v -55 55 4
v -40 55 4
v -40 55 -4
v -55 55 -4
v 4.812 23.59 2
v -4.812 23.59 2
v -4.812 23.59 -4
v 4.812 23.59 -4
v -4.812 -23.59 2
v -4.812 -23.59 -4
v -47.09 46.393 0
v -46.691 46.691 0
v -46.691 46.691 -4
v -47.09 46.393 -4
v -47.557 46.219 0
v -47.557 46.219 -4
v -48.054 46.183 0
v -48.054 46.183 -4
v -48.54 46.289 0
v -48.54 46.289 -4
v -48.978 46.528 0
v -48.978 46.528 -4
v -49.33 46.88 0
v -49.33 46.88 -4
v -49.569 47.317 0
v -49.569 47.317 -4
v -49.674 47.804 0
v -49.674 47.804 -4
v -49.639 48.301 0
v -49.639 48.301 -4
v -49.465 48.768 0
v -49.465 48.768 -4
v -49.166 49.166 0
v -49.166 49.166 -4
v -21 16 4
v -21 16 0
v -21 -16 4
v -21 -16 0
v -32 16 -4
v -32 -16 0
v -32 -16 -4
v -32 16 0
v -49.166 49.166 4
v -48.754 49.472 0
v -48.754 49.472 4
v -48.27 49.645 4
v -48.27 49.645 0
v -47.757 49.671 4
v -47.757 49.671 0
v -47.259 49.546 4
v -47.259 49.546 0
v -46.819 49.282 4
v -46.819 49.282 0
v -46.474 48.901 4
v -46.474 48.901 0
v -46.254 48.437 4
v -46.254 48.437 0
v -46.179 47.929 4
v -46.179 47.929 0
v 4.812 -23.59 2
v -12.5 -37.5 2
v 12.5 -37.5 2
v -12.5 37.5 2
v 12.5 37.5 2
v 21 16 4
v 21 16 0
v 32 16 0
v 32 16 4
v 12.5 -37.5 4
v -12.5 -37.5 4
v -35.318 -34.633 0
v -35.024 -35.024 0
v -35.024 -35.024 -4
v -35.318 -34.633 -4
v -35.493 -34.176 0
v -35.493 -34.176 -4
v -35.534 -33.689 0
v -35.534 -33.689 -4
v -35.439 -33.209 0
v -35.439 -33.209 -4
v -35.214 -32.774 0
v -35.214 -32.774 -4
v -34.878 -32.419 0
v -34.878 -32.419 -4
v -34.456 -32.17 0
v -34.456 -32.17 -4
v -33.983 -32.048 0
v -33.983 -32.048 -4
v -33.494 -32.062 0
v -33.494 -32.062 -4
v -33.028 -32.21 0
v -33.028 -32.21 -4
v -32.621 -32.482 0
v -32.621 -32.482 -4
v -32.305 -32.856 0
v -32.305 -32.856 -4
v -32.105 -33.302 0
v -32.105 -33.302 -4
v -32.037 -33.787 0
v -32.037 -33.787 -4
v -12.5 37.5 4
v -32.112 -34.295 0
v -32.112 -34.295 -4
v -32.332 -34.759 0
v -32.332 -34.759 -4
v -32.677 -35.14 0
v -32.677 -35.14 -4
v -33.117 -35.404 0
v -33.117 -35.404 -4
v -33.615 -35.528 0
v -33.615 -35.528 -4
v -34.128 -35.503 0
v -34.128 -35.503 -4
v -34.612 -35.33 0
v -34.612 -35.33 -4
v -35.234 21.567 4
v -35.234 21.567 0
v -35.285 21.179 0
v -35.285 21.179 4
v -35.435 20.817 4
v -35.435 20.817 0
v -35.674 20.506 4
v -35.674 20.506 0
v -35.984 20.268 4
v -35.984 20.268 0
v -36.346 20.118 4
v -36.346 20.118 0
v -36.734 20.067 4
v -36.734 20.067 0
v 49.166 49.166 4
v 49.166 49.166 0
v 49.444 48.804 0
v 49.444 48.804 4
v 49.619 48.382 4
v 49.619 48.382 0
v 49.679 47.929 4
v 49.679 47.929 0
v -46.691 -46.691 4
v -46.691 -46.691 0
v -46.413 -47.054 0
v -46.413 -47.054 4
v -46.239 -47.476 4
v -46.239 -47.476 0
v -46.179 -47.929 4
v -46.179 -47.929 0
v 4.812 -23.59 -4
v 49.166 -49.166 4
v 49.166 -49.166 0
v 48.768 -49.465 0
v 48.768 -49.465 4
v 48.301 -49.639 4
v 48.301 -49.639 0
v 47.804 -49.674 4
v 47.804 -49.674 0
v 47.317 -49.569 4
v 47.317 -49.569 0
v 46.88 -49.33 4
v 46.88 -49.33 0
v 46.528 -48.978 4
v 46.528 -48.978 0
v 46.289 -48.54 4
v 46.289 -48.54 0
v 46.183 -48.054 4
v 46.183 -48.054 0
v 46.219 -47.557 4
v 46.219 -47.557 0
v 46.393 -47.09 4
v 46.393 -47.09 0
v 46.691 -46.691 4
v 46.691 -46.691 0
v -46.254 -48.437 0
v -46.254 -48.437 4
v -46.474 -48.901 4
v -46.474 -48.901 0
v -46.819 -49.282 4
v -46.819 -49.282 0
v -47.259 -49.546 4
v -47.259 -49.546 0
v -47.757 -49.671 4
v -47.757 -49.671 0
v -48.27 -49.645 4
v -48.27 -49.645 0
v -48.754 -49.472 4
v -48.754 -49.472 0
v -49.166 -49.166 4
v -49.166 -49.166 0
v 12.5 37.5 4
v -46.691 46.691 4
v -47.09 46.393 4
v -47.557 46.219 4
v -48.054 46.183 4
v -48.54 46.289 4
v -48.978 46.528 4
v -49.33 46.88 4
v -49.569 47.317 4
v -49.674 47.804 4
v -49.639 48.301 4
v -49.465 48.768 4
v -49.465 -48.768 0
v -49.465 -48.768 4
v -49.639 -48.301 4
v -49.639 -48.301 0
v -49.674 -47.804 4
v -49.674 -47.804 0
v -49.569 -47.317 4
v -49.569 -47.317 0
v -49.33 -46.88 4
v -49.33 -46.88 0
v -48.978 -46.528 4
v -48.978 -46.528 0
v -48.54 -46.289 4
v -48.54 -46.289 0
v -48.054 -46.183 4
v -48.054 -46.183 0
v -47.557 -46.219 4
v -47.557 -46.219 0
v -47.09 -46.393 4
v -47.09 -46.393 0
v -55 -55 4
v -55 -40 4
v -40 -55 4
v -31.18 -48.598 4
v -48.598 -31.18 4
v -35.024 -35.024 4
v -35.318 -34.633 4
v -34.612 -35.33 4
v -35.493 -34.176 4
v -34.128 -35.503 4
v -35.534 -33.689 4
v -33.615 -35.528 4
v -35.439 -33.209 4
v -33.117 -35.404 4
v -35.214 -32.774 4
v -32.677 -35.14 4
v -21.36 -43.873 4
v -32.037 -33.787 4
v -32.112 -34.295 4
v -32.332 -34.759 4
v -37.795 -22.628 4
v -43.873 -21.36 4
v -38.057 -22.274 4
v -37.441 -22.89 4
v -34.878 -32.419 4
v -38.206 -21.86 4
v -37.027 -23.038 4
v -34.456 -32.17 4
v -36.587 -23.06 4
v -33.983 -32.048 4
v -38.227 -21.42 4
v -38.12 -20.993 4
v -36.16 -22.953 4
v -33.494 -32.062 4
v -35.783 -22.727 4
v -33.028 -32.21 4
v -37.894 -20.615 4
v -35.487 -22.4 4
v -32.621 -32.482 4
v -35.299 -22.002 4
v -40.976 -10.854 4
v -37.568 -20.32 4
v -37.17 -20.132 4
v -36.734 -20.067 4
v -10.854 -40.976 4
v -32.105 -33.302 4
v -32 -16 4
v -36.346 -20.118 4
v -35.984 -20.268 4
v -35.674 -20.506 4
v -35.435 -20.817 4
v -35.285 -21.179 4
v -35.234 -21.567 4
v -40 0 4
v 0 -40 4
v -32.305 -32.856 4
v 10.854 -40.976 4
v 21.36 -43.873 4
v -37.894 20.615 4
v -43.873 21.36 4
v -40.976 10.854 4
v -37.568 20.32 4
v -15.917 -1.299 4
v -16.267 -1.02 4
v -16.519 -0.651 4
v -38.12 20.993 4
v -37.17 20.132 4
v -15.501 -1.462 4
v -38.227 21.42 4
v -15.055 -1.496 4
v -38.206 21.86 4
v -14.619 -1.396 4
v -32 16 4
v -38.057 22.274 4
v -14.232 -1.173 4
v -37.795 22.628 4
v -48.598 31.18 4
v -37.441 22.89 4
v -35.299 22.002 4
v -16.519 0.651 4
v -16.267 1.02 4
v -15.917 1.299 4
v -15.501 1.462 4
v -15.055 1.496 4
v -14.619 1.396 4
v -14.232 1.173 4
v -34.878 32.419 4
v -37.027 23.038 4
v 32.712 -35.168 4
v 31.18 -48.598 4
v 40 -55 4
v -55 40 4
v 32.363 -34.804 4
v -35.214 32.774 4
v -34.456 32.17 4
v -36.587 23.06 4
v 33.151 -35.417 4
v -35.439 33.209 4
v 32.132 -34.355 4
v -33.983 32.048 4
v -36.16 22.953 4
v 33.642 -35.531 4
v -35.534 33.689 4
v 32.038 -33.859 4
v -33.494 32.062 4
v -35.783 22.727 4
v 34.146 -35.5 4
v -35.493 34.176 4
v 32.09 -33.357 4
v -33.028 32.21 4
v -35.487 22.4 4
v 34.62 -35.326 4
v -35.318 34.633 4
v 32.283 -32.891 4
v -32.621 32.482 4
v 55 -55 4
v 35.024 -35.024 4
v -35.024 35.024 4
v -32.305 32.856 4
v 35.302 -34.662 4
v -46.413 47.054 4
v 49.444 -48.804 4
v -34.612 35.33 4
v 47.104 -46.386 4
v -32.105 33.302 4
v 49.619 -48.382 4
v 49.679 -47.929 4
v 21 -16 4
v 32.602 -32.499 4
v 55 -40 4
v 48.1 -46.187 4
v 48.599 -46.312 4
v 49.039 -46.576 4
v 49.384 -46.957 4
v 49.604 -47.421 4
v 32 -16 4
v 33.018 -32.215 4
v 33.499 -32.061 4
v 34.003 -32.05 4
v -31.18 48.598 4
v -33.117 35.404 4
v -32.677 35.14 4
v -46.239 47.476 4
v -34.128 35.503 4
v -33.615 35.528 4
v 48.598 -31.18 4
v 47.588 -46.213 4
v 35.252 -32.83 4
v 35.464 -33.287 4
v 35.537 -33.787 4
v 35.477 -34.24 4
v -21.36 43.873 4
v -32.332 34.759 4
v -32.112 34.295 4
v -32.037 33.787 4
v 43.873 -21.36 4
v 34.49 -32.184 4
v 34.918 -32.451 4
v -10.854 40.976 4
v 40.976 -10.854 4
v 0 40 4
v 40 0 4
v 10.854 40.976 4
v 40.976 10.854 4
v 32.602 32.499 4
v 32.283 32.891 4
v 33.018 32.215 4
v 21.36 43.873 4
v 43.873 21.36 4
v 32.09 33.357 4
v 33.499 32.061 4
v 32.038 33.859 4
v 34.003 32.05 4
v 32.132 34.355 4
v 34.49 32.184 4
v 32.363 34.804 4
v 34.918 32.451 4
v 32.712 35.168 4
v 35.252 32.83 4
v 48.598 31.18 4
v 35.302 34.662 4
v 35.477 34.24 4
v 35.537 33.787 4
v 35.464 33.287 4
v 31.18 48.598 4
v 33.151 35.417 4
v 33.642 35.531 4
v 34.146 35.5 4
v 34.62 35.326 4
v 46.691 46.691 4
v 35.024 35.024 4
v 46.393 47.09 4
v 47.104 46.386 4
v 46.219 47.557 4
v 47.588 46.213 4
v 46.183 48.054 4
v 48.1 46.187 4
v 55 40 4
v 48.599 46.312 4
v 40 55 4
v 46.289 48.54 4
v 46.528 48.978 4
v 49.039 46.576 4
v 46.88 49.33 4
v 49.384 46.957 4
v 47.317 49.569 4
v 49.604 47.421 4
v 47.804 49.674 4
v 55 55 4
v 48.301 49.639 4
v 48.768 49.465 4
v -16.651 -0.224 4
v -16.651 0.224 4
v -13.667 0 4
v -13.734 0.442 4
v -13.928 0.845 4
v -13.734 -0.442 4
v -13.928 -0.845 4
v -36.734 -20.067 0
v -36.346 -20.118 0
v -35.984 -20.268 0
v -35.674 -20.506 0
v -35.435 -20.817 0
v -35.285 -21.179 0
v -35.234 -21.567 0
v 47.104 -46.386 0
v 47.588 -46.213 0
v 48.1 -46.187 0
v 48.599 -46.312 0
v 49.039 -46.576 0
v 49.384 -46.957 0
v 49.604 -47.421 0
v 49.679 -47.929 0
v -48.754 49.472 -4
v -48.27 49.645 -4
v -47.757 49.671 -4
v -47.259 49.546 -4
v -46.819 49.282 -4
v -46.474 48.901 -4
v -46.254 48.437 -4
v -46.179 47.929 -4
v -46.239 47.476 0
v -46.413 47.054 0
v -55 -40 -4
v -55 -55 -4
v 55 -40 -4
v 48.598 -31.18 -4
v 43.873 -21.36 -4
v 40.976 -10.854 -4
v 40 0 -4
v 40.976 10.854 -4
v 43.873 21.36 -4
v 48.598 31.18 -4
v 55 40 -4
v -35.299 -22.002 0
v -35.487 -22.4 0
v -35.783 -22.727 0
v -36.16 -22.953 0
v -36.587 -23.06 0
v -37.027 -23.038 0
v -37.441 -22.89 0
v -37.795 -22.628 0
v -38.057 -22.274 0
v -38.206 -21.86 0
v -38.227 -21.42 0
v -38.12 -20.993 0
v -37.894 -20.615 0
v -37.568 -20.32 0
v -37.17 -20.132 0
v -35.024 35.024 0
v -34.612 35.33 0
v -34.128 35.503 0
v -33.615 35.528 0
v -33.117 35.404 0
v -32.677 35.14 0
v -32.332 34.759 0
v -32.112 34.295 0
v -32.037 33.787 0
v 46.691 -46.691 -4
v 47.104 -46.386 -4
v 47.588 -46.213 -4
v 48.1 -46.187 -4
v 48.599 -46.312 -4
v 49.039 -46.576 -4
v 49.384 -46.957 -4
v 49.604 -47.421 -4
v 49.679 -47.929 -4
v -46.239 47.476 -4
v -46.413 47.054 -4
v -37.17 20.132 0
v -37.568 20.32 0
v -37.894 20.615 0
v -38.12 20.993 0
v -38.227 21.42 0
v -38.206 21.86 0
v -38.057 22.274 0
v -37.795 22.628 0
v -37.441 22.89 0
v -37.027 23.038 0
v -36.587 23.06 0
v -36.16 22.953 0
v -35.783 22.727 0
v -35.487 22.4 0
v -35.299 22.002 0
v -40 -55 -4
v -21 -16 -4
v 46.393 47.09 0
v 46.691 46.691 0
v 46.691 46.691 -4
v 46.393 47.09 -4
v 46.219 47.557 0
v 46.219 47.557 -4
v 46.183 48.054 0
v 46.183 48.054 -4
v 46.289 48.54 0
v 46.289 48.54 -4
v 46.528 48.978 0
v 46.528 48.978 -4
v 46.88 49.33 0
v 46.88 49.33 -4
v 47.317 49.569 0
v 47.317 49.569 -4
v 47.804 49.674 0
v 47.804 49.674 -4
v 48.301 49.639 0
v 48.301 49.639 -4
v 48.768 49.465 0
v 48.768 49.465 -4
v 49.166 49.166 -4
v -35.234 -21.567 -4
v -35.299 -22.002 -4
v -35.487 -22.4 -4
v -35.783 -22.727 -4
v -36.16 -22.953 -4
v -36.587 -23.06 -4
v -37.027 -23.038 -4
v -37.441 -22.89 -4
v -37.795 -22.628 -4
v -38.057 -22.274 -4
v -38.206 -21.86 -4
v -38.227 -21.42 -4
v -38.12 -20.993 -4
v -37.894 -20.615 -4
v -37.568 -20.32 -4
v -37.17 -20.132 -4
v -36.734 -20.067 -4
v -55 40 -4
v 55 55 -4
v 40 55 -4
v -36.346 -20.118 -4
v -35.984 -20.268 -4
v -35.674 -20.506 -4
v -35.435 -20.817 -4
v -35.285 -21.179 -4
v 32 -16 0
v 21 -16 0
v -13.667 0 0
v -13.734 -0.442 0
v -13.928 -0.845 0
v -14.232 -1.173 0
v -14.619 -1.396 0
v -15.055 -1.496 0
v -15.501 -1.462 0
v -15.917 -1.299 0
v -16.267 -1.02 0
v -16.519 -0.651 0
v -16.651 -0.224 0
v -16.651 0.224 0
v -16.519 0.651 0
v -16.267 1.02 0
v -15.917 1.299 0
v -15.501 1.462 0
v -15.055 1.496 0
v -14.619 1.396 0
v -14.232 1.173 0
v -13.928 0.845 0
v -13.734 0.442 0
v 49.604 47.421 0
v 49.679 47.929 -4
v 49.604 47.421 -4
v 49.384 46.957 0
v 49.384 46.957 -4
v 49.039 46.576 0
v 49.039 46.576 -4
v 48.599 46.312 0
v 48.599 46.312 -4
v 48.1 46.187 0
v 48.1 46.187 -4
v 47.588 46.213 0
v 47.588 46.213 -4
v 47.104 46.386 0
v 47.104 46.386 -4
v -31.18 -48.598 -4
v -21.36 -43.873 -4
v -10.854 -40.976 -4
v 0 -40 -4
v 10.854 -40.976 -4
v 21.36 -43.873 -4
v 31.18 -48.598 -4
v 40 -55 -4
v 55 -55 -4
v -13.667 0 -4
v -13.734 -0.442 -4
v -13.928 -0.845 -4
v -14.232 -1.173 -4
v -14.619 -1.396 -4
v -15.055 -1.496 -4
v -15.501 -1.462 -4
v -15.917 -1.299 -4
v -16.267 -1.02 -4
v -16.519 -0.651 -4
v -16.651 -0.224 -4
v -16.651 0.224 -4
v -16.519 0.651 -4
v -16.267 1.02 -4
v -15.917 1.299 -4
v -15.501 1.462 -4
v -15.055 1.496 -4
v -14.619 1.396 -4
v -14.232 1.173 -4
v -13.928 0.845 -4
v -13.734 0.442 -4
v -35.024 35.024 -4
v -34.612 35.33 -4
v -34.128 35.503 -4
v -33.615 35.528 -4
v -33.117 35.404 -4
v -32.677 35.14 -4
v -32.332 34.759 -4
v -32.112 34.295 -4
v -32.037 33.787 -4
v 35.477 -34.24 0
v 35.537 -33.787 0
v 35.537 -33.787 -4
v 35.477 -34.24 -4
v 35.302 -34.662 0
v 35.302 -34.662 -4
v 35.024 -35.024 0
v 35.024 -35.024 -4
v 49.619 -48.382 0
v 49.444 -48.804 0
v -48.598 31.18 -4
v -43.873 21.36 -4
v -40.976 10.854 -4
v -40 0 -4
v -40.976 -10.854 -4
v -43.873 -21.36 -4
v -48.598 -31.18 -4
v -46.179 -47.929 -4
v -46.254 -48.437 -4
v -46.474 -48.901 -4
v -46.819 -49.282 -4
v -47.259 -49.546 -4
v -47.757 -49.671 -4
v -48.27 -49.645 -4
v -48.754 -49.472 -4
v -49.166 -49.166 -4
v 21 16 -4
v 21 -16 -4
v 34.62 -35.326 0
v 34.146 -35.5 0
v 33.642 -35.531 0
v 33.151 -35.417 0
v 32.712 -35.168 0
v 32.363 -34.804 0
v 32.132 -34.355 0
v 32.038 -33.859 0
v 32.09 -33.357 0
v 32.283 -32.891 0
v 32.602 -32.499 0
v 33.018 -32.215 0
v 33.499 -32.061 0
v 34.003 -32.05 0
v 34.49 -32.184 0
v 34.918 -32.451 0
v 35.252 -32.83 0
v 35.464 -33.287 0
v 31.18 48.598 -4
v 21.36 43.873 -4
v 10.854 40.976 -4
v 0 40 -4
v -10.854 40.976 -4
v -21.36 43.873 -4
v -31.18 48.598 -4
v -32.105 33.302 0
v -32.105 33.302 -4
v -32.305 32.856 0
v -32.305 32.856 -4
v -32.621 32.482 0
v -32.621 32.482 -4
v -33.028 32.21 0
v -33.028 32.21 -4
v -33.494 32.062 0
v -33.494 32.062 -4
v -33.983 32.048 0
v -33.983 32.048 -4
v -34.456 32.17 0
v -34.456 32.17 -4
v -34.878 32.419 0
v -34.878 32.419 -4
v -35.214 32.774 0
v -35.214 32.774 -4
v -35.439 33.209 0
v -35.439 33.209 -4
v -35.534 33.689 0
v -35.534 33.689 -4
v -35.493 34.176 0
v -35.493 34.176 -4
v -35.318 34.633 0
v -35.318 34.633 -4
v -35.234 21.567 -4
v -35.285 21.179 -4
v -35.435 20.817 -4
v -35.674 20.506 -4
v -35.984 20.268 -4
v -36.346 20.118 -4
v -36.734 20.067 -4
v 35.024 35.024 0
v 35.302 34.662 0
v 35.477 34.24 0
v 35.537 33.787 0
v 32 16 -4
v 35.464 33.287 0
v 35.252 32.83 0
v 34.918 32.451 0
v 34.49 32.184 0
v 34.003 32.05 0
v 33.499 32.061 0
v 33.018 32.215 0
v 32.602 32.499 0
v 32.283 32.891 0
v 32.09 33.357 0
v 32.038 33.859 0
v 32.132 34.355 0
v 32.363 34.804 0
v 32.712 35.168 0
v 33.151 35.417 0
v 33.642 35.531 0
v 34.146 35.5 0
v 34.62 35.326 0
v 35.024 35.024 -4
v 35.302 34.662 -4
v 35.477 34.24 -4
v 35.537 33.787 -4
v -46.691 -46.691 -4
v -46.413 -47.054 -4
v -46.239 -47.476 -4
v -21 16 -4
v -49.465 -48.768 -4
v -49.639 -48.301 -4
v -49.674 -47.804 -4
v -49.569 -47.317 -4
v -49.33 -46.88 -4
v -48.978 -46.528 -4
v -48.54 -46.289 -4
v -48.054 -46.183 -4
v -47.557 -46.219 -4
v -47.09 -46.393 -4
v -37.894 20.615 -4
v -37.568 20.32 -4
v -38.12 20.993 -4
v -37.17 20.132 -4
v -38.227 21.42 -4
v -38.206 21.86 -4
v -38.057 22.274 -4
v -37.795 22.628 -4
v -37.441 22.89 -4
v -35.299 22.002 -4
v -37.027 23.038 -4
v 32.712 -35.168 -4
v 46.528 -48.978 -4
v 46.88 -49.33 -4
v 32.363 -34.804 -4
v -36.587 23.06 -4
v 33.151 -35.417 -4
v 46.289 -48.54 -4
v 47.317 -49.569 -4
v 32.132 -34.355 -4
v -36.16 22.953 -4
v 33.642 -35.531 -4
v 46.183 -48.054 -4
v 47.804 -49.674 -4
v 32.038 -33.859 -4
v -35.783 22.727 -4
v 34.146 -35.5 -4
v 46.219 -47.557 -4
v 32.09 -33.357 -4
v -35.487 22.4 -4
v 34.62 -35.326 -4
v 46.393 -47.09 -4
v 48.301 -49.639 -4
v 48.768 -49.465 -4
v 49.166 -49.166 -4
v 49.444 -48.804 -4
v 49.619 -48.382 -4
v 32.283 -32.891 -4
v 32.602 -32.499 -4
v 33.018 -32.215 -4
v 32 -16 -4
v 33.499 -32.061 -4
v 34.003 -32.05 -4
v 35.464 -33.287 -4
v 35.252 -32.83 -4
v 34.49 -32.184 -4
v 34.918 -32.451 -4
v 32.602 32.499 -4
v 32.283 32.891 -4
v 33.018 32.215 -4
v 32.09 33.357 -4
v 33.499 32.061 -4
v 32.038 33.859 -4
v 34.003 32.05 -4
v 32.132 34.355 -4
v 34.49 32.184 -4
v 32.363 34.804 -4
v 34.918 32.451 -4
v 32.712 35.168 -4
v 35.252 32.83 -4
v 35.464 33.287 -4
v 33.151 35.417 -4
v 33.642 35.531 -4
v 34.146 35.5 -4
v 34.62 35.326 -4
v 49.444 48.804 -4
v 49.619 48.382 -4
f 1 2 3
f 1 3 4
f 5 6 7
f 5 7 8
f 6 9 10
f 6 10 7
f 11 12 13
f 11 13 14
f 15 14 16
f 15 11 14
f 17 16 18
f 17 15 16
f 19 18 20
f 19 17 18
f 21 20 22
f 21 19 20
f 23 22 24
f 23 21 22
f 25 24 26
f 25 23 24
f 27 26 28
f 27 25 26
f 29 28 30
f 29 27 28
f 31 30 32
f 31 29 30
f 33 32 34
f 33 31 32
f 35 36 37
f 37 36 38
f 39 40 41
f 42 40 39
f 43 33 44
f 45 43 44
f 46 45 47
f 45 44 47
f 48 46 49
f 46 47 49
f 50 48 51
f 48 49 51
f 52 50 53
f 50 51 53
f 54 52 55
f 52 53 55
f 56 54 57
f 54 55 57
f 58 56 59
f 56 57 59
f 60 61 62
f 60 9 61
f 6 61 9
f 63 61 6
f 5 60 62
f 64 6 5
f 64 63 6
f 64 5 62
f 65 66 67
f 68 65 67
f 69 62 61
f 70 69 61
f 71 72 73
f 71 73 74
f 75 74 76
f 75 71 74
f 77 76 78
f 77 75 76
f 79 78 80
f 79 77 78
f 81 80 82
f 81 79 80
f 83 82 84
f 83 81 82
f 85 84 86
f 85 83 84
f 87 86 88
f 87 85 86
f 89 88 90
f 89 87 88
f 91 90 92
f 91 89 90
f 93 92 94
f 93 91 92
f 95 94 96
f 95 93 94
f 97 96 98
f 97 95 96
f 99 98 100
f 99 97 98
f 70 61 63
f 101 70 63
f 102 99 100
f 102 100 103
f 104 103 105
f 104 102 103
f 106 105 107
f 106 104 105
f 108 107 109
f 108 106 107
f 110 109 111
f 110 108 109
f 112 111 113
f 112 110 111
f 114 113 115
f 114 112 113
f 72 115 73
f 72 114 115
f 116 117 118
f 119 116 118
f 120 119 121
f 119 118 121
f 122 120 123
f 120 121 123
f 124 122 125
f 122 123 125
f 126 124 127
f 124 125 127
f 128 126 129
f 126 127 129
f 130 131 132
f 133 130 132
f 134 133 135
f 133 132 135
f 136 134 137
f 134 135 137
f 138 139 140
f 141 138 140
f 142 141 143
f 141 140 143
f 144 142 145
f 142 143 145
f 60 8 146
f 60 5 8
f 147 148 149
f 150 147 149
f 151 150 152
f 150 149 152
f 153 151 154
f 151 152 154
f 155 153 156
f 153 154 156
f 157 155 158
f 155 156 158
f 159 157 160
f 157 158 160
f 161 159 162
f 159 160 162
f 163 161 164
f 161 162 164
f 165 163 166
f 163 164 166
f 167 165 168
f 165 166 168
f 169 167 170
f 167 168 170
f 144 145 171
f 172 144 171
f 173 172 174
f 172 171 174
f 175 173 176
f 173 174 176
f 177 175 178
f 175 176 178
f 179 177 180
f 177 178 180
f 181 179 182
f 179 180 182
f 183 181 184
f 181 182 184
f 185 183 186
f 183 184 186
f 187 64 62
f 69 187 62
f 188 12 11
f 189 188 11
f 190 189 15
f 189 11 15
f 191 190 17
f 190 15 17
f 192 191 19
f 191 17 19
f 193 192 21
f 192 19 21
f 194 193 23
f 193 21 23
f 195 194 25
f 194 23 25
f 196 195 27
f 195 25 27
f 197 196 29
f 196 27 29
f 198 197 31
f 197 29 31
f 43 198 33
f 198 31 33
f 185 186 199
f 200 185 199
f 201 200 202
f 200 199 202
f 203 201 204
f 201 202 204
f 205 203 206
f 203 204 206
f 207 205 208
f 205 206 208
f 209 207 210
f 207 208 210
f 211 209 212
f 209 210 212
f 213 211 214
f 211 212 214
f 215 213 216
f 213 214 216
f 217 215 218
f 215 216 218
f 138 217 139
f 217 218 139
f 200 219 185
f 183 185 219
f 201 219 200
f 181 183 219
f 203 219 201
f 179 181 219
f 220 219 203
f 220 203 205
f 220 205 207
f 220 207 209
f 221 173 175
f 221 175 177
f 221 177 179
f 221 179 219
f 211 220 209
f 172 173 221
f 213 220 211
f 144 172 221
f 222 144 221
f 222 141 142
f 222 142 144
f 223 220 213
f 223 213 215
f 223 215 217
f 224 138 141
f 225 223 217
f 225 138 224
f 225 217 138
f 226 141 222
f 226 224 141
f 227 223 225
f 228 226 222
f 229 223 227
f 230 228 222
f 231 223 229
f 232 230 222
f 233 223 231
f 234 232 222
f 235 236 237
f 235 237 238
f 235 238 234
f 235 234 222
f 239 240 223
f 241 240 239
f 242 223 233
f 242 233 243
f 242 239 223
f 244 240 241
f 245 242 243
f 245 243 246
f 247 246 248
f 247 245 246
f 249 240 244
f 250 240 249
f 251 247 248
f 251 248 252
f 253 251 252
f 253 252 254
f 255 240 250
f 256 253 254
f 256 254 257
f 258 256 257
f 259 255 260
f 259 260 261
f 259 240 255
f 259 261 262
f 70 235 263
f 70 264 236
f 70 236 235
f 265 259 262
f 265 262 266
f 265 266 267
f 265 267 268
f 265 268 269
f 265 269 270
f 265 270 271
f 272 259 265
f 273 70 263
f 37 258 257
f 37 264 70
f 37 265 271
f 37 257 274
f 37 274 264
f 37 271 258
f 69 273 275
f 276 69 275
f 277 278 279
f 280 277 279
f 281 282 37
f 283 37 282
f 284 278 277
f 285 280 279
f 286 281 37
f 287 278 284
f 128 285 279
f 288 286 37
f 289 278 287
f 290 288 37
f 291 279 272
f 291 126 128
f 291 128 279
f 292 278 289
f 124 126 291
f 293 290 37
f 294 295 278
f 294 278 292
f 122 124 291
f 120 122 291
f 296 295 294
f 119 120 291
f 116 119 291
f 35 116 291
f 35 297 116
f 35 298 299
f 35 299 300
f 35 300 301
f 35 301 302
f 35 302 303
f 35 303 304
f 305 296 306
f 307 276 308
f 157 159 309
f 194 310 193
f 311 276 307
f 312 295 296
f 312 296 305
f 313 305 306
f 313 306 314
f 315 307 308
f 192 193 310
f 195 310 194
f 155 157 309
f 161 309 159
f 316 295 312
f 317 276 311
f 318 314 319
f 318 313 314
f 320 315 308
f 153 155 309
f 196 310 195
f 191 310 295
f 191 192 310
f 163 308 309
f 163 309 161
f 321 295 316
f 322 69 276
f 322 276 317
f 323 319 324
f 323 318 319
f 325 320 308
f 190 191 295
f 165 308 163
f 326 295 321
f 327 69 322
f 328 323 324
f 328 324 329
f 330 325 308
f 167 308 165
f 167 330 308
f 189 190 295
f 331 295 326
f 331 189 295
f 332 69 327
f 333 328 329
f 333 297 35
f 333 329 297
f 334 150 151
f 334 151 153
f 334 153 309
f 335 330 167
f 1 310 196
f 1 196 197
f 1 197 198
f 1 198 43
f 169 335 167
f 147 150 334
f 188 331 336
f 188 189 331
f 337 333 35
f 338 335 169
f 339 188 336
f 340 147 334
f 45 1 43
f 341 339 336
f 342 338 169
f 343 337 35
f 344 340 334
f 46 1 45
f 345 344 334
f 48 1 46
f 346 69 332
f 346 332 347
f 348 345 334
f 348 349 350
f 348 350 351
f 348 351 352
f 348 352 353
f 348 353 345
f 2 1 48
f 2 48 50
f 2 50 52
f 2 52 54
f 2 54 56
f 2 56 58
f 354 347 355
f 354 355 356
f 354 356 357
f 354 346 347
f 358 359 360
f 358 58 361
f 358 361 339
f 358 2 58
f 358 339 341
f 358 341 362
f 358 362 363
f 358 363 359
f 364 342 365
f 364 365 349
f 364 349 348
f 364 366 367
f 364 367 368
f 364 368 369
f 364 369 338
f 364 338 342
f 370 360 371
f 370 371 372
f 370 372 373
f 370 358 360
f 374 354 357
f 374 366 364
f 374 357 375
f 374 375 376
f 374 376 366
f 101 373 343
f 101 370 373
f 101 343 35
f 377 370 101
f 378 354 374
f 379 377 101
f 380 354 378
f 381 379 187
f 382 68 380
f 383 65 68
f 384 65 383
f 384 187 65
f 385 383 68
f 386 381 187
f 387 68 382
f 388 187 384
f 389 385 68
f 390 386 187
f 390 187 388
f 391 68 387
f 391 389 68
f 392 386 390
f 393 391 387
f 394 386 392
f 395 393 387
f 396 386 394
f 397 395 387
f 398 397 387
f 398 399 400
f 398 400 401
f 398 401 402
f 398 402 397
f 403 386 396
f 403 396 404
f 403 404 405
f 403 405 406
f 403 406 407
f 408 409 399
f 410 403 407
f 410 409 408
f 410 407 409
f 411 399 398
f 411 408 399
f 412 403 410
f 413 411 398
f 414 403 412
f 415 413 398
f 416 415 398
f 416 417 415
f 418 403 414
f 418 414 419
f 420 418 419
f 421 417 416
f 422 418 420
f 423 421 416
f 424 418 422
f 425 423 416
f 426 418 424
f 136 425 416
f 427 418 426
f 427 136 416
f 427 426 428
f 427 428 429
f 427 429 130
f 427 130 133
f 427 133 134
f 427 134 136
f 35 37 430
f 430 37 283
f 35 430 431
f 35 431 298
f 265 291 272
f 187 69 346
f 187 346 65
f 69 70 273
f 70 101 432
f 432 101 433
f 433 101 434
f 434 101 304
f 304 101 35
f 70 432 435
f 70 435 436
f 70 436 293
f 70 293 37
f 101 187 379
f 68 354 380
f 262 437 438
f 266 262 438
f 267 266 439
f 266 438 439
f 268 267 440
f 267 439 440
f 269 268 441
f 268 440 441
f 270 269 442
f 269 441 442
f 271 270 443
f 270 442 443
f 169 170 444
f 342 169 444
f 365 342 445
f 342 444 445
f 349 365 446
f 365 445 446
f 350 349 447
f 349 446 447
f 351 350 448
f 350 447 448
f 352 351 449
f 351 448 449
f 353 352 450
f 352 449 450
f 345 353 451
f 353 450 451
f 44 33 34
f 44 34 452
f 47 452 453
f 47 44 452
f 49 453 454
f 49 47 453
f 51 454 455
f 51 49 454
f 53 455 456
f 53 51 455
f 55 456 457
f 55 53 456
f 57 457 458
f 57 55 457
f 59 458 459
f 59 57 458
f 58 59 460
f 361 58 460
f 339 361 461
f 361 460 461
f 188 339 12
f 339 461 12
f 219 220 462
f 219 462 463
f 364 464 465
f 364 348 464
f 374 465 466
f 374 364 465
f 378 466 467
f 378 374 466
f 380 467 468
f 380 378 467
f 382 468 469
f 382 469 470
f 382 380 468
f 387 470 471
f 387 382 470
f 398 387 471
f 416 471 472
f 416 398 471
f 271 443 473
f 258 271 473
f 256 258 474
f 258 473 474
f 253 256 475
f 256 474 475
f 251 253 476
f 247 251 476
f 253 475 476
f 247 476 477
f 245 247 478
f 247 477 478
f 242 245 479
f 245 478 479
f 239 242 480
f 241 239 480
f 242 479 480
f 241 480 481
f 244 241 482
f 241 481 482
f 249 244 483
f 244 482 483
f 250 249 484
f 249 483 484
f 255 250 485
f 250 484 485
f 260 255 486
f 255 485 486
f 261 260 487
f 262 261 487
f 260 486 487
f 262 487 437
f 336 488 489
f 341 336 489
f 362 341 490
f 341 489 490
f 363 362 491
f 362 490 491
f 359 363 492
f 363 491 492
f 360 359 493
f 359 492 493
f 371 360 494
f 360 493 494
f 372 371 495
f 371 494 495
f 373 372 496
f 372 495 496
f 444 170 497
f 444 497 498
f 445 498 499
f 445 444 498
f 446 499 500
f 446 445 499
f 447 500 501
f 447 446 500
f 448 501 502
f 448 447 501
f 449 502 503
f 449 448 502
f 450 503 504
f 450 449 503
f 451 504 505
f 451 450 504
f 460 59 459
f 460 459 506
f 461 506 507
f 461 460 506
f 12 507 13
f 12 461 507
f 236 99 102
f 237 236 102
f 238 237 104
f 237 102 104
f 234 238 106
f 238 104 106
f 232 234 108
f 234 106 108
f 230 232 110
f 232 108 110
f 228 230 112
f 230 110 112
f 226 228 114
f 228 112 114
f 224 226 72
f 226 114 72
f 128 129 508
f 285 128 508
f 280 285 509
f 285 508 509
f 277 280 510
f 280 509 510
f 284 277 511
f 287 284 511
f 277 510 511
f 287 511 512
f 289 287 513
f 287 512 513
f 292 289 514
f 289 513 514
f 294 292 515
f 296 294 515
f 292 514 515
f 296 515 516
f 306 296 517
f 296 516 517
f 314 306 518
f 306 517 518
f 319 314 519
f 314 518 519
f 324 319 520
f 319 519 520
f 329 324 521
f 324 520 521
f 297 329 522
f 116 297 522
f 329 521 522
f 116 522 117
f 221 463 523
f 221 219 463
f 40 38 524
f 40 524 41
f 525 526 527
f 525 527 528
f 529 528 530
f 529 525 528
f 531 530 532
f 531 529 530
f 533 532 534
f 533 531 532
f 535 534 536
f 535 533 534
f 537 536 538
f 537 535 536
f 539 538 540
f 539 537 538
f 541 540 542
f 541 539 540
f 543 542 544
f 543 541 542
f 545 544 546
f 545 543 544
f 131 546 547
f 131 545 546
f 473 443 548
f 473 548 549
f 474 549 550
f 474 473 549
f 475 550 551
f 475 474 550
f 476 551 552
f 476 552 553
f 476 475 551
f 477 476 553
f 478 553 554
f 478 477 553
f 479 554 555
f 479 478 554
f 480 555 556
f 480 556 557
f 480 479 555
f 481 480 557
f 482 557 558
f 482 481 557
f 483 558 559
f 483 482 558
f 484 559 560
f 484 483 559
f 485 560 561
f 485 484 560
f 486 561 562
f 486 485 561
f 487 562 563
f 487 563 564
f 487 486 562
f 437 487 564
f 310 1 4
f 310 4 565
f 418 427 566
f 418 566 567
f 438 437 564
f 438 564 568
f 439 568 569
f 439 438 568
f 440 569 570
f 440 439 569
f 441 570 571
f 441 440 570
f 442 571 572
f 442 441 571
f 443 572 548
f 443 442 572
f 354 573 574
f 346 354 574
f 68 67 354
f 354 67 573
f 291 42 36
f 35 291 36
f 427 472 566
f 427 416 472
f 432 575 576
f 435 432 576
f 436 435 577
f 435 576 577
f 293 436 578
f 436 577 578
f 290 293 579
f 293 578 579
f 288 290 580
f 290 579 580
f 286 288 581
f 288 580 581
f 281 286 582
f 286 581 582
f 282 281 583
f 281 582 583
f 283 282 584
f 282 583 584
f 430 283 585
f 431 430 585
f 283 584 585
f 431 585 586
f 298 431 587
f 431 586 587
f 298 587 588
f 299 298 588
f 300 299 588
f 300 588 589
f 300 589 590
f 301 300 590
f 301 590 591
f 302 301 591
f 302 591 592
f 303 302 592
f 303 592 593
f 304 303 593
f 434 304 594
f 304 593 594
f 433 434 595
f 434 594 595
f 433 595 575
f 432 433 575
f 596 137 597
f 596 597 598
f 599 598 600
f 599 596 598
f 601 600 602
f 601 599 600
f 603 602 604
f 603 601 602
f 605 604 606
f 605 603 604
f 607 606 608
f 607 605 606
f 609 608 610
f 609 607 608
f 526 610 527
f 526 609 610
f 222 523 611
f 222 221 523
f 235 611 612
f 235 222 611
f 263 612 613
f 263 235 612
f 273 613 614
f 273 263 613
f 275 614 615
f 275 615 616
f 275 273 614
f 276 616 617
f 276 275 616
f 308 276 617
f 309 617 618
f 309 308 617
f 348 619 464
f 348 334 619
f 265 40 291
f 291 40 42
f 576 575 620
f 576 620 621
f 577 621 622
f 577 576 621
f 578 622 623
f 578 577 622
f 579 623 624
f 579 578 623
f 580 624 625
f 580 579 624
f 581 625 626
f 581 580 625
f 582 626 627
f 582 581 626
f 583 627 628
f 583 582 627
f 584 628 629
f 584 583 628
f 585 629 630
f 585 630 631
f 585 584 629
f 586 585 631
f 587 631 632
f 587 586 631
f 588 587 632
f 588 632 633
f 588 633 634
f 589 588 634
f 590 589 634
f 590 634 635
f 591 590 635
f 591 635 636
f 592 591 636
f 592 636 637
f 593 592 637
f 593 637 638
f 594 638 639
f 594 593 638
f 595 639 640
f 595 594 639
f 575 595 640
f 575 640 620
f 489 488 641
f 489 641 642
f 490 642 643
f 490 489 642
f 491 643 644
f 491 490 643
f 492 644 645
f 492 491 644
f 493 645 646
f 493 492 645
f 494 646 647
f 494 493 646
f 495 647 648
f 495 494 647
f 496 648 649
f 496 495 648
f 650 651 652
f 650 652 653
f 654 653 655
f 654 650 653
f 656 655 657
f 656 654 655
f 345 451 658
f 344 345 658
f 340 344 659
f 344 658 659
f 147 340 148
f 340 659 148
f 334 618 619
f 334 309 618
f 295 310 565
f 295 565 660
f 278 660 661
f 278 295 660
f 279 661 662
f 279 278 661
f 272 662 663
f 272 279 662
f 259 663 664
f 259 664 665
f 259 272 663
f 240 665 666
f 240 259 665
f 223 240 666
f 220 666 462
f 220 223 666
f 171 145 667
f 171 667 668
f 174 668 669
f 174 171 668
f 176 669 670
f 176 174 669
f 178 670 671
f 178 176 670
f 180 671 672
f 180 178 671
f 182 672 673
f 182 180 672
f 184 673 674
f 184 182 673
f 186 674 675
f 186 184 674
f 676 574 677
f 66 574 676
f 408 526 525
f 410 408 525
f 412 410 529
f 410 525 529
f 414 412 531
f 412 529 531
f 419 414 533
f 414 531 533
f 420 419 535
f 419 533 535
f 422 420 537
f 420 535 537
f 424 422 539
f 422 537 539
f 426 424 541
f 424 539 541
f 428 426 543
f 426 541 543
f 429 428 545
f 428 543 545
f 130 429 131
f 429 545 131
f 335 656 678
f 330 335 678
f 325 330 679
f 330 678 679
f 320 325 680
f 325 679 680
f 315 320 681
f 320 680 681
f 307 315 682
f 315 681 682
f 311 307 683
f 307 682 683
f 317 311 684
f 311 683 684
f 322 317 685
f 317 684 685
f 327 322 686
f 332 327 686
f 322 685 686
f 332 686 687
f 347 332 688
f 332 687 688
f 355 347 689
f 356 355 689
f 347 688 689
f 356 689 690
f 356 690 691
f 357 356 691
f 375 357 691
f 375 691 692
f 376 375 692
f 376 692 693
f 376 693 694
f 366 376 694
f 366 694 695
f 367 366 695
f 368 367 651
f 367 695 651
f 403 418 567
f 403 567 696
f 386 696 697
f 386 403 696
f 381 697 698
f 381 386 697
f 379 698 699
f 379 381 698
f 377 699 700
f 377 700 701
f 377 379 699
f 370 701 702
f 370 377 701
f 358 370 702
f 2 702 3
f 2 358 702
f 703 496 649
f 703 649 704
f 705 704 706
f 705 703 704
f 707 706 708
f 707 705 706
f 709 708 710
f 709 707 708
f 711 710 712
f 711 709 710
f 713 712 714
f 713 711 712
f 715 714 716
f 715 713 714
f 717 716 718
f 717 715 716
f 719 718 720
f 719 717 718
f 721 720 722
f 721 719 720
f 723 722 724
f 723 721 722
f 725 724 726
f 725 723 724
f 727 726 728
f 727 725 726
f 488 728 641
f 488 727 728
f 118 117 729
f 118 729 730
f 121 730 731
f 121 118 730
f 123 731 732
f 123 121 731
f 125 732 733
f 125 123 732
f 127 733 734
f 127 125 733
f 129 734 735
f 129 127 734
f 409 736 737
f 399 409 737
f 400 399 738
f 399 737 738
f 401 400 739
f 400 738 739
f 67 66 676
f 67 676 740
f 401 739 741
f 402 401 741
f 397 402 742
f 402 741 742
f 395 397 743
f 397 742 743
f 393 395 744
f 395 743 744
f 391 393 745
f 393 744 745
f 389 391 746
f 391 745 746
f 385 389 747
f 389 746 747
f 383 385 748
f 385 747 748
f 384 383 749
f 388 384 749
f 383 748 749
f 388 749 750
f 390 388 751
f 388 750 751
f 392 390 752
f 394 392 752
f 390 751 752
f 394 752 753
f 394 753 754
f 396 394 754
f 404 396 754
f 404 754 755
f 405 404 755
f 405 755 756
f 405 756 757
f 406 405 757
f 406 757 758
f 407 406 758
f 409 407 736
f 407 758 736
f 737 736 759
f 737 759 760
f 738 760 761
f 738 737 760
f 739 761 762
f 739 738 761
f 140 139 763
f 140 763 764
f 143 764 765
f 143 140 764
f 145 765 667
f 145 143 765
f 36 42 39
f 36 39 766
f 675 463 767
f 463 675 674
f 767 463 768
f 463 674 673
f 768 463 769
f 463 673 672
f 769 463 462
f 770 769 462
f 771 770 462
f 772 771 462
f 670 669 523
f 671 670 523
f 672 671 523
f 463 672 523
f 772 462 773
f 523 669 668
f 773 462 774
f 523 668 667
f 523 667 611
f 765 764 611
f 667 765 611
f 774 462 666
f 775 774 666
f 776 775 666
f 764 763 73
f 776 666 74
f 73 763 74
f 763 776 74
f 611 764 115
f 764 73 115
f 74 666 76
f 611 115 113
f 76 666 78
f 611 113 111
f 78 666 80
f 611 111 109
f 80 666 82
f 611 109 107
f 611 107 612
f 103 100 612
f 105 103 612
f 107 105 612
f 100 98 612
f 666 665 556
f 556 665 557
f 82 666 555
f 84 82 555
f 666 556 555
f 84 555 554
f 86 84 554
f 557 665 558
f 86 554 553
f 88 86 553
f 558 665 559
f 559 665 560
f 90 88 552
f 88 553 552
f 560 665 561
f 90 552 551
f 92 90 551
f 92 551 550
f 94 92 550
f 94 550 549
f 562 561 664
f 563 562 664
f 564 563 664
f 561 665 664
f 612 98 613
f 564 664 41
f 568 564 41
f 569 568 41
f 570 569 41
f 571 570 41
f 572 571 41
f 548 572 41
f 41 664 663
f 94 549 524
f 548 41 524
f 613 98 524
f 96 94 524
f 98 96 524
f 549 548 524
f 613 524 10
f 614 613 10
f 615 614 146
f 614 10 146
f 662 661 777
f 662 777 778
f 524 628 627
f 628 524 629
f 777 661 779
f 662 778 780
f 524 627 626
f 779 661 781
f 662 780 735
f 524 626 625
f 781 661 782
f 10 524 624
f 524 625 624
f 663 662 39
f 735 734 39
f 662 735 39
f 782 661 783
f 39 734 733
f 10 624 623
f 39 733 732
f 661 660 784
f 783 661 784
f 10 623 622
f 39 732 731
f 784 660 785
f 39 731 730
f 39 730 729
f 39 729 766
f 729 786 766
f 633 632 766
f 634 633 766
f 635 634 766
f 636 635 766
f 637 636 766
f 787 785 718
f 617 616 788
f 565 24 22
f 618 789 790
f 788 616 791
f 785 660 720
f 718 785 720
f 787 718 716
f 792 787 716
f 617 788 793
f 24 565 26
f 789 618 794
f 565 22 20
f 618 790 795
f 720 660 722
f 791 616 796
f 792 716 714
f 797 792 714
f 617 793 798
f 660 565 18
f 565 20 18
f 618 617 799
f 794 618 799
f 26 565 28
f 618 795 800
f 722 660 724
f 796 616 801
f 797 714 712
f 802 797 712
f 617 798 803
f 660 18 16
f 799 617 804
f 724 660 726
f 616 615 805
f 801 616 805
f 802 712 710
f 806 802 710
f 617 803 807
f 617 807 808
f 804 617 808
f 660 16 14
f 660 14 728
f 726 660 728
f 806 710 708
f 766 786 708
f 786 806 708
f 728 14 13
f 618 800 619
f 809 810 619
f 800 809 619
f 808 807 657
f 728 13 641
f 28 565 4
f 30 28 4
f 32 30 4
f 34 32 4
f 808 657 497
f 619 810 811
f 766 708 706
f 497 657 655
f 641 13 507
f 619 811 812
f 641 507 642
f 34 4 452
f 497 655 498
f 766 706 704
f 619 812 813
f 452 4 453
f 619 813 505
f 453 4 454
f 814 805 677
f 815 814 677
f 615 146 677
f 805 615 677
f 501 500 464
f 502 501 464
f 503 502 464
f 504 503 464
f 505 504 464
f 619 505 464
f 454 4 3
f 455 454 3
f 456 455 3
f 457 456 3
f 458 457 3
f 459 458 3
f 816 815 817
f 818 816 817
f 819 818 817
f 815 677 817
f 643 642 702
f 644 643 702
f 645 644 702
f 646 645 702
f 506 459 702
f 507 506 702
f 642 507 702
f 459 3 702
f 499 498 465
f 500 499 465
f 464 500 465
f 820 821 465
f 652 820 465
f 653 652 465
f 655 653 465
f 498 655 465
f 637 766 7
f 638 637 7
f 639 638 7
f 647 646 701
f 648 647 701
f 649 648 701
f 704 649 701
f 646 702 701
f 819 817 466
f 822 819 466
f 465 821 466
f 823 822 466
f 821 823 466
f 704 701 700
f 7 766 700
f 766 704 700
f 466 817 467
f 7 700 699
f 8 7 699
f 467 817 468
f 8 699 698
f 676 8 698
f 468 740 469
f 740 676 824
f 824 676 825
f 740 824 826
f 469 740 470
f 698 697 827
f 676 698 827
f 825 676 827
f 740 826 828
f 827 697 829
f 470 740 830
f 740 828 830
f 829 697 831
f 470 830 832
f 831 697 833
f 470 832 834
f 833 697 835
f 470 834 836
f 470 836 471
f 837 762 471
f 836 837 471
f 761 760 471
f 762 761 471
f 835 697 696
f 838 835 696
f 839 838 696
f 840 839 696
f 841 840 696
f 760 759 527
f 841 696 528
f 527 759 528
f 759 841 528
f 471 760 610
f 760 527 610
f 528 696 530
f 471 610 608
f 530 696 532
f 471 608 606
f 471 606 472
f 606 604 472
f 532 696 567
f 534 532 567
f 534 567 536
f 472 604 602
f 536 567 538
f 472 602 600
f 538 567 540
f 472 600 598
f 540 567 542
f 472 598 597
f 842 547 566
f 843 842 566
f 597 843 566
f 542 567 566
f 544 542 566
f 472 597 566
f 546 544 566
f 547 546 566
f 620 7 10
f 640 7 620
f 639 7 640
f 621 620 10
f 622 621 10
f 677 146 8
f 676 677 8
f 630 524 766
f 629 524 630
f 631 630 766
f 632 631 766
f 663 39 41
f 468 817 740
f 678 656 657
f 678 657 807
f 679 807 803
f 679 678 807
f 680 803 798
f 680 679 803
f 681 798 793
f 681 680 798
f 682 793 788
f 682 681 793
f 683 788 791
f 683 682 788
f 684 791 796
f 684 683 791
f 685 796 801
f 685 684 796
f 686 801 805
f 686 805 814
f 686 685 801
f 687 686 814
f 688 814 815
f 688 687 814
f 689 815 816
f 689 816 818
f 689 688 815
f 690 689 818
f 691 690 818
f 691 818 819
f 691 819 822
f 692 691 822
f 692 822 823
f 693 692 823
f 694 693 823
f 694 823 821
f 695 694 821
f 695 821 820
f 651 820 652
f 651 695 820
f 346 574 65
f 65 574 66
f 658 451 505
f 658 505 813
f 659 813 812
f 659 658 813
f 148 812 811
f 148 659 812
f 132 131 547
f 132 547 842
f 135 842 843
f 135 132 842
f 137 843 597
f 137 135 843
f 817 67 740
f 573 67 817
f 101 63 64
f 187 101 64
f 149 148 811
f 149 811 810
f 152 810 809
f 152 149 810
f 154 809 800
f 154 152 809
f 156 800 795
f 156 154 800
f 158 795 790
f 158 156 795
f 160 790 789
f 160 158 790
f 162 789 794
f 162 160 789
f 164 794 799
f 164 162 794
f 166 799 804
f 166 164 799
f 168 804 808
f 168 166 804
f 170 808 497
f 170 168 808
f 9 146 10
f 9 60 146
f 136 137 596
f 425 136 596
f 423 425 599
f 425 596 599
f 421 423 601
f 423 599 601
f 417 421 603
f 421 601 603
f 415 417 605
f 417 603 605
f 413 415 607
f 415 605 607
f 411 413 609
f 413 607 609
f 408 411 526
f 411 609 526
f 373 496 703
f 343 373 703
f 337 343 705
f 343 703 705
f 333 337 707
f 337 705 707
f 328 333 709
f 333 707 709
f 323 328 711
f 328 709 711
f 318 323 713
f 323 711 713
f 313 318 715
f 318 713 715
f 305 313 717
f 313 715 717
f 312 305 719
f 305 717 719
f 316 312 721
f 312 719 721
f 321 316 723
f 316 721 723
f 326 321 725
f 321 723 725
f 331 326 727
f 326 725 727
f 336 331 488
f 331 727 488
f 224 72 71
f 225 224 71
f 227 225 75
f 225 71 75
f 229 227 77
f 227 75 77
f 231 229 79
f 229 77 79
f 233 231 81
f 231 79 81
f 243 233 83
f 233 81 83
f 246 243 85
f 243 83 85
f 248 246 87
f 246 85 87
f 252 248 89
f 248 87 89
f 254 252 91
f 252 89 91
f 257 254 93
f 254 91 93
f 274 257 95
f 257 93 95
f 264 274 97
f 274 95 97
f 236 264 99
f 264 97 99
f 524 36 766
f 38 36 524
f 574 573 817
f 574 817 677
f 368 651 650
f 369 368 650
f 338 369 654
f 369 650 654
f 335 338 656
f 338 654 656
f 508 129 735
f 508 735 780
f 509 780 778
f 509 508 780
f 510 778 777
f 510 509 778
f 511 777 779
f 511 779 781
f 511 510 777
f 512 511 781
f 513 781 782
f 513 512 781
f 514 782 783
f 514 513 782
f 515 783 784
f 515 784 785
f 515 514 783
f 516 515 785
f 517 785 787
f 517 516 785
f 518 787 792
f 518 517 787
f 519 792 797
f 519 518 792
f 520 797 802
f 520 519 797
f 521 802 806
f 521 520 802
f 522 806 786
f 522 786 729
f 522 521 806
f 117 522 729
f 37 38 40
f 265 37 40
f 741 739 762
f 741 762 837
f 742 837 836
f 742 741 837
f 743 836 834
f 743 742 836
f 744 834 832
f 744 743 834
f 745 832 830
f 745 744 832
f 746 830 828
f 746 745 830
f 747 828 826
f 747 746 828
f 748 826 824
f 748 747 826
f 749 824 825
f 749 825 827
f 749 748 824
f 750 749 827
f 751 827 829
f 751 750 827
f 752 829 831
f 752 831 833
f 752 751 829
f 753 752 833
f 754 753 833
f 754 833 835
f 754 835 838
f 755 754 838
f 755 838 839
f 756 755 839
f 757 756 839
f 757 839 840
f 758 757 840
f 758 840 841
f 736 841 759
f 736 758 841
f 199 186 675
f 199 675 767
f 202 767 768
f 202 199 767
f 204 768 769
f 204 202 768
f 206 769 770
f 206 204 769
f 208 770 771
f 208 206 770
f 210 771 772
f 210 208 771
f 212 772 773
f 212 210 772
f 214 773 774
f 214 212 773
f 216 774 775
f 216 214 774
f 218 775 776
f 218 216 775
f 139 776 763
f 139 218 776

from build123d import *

# Parameters (mm, degrees)
F1_DEPTH = 4
F2_DEPTH = 2
F3_DEPTH = 4


# Not quite as in the source:
# - a feature names something its author has since deleted; it is built from what else it names


with BuildPart() as f1:
    # F0 (on Top) → F1 (new body, symmetric)
    with BuildSketch(Plane.XY):
        with BuildLine():
            Line((55, 40), (55, 55))
            Line((55, 55), (40, 55))
            ThreePointArc((40, 55), (21.3600093633, 43.8733083646), (0, 40))
            Line((0, 40), (0, 37.5))
            Line((0, 37.5), (12.5, 37.5))
            Line((12.5, 37.5), (12.5, 0))
            Line((12.5, 0), (21, 0))
            Line((21, 0), (21, 16))
            Line((21, 16), (32, 16))
            Line((32, 16), (32, 0))
            Line((32, 0), (40, 0))
            ThreePointArc((40, 0), (43.8733083645, 21.3600093633), (55, 40))
        make_face()
        with BuildLine():
            ThreePointArc((35.5367965644, 33.7867965644), (32.1700073825, 33.1171005578), (35.0242334315, 35.0242334315))
            ThreePointArc((35.0242334315, 35.0242334315), (35.4035857463, 34.456492571), (35.5367965644, 33.7867965644))
        make_face(mode=Mode.SUBTRACT)
        with BuildLine():
            ThreePointArc((46.6914953211, 46.6914953211), (46.6914953211, 49.1663690552), (49.1663690552, 49.1663690552))
            ThreePointArc((49.1663690552, 49.1663690552), (49.54572137, 48.5986281948), (49.6789321881, 47.9289321881))
            ThreePointArc((49.6789321881, 47.9289321881), (48.5986281948, 46.3121430062), (46.6914953211, 46.6914953211))
        make_face(mode=Mode.SUBTRACT)
        with BuildLine():
            Line((-12.5, -37.5), (-12.5, 0))
            Line((-12.5, 0), (-13.6673537509, 0))
            ThreePointArc((-13.6673537509, 0), (-15.1673537509, -1.5), (-16.6673537509, 0))
            Line((-16.6673537509, 0), (-21, 0))
            Line((-21, 0), (-21, -16))
            Line((-21, -16), (-32, -16))
            Line((-32, -16), (-32, 0))
            Line((-32, 0), (-36.7343537509, 0))
            Line((-36.7343537509, 0), (-40, 0))
            ThreePointArc((-40, 0), (-43.8733083645, -21.3600093633), (-55, -40))
            Line((-55, -40), (-55, -55))
            Line((-55, -55), (-40, -55))
            ThreePointArc((-40, -55), (-21.3600093633, -43.8733083646), (0, -40))
            Line((0, -40), (0, -37.5))
            Line((0, -37.5), (-12.5, -37.5))
        make_face()
        with BuildLine():
            ThreePointArc((-46.1789321881, -47.9289321881), (-47.2592361815, -49.54572137), (-49.1663690552, -49.1663690552))
            ThreePointArc((-49.1663690552, -49.1663690552), (-49.1663690552, -46.6914953211), (-46.6914953211, -46.6914953211))
            ThreePointArc((-46.6914953211, -46.6914953211), (-46.3121430062, -47.2592361815), (-46.1789321881, -47.9289321881))
        make_face(mode=Mode.SUBTRACT)
        with BuildLine():
            ThreePointArc((-32.0367965644, -33.7867965644), (-33.1171005578, -35.4035857463), (-35.0242334315, -35.0242334315))
            ThreePointArc((-35.0242334315, -35.0242334315), (-34.456492571, -32.1700073825), (-32.0367965644, -33.7867965644))
        make_face(mode=Mode.SUBTRACT)
        with BuildLine():
            ThreePointArc((-35.2343537509, -21.567), (-37.7950139227, -22.6276601718), (-36.7343537509, -20.067))
            ThreePointArc((-36.7343537509, -20.067), (-35.6736935792, -20.5063398282), (-35.2343537509, -21.567))
        make_face(mode=Mode.SUBTRACT)
        with BuildLine():
            Line((0, 37.5), (0, 40))
            ThreePointArc((0, 40), (-21.3600093633, 43.8733083645), (-40, 55))
            Line((-40, 55), (-55, 55))
            Line((-55, 55), (-55, 40))
            ThreePointArc((-55, 40), (-43.8733083646, 21.3600093633), (-40, 0))
            Line((-40, 0), (-36.7343537509, 0))
            Line((-36.7343537509, 0), (-32, 0))
            Line((-32, 0), (-32, 16))
            Line((-32, 16), (-21, 16))
            Line((-21, 16), (-21, 0))
            Line((-21, 0), (-16.6673537509, 0))
            ThreePointArc((-16.6673537509, 0), (-15.1673537509, 1.5), (-13.6673537509, 0))
            Line((-13.6673537509, 0), (-12.5, 0))
            Line((-12.5, 0), (-12.5, 37.5))
            Line((-12.5, 37.5), (0, 37.5))
        make_face()
        with BuildLine():
            ThreePointArc((-35.2343537509, 21.567), (-35.6736935792, 20.5063398282), (-36.7343537509, 20.067))
            ThreePointArc((-36.7343537509, 20.067), (-37.7950139227, 22.6276601718), (-35.2343537509, 21.567))
        make_face(mode=Mode.SUBTRACT)
        with BuildLine():
            ThreePointArc((-32.0367965644, 33.7867965644), (-34.456492571, 32.1700073825), (-35.0242334315, 35.0242334315))
            ThreePointArc((-35.0242334315, 35.0242334315), (-33.1171005578, 35.4035857463), (-32.0367965644, 33.7867965644))
        make_face(mode=Mode.SUBTRACT)
        with BuildLine():
            ThreePointArc((-46.6914953211, 46.6914953211), (-49.1663690552, 46.6914953211), (-49.1663690552, 49.1663690552))
            ThreePointArc((-49.1663690552, 49.1663690552), (-47.2592361815, 49.54572137), (-46.1789321881, 47.9289321881))
            ThreePointArc((-46.1789321881, 47.9289321881), (-46.3121430062, 47.2592361815), (-46.6914953211, 46.6914953211))
        make_face(mode=Mode.SUBTRACT)
        with BuildLine():
            ThreePointArc((55, -40), (43.8733083646, -21.3600093633), (40, 0))
            Line((40, 0), (32, 0))
            Line((32, 0), (32, -16))
            Line((32, -16), (21, -16))
            Line((21, -16), (21, 0))
            Line((21, 0), (12.5, 0))
            Line((12.5, 0), (12.5, -37.5))
            Line((12.5, -37.5), (0, -37.5))
            Line((0, -37.5), (0, -40))
            ThreePointArc((0, -40), (21.3600093633, -43.8733083645), (40, -55))
            Line((40, -55), (55, -55))
            Line((55, -55), (55, -40))
        make_face()
        with BuildLine():
            ThreePointArc((49.6789321881, -47.9289321881), (49.54572137, -48.5986281948), (49.1663690552, -49.1663690552))
            ThreePointArc((49.1663690552, -49.1663690552), (46.6914953211, -49.1663690552), (46.6914953211, -46.6914953211))
            ThreePointArc((46.6914953211, -46.6914953211), (48.5986281948, -46.3121430062), (49.6789321881, -47.9289321881))
        make_face(mode=Mode.SUBTRACT)
        with BuildLine():
            ThreePointArc((35.5367965644, -33.7867965644), (35.4035857463, -34.456492571), (35.0242334315, -35.0242334315))
            ThreePointArc((35.0242334315, -35.0242334315), (32.1700073825, -33.1171005578), (35.5367965644, -33.7867965644))
        make_face(mode=Mode.SUBTRACT)
    extrude(amount=F1_DEPTH, both=True)

    # F0 (on Top) → F2 (join, symmetric)
    with BuildSketch(Plane.XY):
        Polygon((-4.8118475825, 0), (-12.5, 0), (-12.5, -37.5), (0, -37.5), (0, -23.5897935927), (-4.8118475825, -23.5897935927), align=None)
        Polygon((12.5, -37.5), (12.5, 0), (4.8118475825, 0), (4.8118475825, -23.5897935927), (0, -23.5897935927), (0, -37.5), align=None)
        Polygon((0, 23.5897935927), (0, 37.5), (-12.5, 37.5), (-12.5, 0), (-4.8118475825, 0), (-4.8118475825, 23.5897935927), align=None)
        Polygon((12.5, 37.5), (0, 37.5), (0, 23.5897935927), (4.8118475825, 23.5897935927), (4.8118475825, 0), (12.5, 0), align=None)
    extrude(amount=F2_DEPTH, both=True)

    # F0 (on Top) → F3 (join)
    with BuildSketch(Plane.XY):
        Polygon((-4.8118475825, 0), (-12.5, 0), (-12.5, -37.5), (0, -37.5), (0, -23.5897935927), (-4.8118475825, -23.5897935927), align=None)
        Polygon((12.5, -37.5), (12.5, 0), (4.8118475825, 0), (4.8118475825, -23.5897935927), (0, -23.5897935927), (0, -37.5), align=None)
        Polygon((0, 23.5897935927), (0, 37.5), (-12.5, 37.5), (-12.5, 0), (-4.8118475825, 0), (-4.8118475825, 23.5897935927), align=None)
        Polygon((12.5, 37.5), (0, 37.5), (0, 23.5897935927), (4.8118475825, 23.5897935927), (4.8118475825, 0), (12.5, 0), align=None)
    extrude(amount=-F3_DEPTH)


solid = f1.part
